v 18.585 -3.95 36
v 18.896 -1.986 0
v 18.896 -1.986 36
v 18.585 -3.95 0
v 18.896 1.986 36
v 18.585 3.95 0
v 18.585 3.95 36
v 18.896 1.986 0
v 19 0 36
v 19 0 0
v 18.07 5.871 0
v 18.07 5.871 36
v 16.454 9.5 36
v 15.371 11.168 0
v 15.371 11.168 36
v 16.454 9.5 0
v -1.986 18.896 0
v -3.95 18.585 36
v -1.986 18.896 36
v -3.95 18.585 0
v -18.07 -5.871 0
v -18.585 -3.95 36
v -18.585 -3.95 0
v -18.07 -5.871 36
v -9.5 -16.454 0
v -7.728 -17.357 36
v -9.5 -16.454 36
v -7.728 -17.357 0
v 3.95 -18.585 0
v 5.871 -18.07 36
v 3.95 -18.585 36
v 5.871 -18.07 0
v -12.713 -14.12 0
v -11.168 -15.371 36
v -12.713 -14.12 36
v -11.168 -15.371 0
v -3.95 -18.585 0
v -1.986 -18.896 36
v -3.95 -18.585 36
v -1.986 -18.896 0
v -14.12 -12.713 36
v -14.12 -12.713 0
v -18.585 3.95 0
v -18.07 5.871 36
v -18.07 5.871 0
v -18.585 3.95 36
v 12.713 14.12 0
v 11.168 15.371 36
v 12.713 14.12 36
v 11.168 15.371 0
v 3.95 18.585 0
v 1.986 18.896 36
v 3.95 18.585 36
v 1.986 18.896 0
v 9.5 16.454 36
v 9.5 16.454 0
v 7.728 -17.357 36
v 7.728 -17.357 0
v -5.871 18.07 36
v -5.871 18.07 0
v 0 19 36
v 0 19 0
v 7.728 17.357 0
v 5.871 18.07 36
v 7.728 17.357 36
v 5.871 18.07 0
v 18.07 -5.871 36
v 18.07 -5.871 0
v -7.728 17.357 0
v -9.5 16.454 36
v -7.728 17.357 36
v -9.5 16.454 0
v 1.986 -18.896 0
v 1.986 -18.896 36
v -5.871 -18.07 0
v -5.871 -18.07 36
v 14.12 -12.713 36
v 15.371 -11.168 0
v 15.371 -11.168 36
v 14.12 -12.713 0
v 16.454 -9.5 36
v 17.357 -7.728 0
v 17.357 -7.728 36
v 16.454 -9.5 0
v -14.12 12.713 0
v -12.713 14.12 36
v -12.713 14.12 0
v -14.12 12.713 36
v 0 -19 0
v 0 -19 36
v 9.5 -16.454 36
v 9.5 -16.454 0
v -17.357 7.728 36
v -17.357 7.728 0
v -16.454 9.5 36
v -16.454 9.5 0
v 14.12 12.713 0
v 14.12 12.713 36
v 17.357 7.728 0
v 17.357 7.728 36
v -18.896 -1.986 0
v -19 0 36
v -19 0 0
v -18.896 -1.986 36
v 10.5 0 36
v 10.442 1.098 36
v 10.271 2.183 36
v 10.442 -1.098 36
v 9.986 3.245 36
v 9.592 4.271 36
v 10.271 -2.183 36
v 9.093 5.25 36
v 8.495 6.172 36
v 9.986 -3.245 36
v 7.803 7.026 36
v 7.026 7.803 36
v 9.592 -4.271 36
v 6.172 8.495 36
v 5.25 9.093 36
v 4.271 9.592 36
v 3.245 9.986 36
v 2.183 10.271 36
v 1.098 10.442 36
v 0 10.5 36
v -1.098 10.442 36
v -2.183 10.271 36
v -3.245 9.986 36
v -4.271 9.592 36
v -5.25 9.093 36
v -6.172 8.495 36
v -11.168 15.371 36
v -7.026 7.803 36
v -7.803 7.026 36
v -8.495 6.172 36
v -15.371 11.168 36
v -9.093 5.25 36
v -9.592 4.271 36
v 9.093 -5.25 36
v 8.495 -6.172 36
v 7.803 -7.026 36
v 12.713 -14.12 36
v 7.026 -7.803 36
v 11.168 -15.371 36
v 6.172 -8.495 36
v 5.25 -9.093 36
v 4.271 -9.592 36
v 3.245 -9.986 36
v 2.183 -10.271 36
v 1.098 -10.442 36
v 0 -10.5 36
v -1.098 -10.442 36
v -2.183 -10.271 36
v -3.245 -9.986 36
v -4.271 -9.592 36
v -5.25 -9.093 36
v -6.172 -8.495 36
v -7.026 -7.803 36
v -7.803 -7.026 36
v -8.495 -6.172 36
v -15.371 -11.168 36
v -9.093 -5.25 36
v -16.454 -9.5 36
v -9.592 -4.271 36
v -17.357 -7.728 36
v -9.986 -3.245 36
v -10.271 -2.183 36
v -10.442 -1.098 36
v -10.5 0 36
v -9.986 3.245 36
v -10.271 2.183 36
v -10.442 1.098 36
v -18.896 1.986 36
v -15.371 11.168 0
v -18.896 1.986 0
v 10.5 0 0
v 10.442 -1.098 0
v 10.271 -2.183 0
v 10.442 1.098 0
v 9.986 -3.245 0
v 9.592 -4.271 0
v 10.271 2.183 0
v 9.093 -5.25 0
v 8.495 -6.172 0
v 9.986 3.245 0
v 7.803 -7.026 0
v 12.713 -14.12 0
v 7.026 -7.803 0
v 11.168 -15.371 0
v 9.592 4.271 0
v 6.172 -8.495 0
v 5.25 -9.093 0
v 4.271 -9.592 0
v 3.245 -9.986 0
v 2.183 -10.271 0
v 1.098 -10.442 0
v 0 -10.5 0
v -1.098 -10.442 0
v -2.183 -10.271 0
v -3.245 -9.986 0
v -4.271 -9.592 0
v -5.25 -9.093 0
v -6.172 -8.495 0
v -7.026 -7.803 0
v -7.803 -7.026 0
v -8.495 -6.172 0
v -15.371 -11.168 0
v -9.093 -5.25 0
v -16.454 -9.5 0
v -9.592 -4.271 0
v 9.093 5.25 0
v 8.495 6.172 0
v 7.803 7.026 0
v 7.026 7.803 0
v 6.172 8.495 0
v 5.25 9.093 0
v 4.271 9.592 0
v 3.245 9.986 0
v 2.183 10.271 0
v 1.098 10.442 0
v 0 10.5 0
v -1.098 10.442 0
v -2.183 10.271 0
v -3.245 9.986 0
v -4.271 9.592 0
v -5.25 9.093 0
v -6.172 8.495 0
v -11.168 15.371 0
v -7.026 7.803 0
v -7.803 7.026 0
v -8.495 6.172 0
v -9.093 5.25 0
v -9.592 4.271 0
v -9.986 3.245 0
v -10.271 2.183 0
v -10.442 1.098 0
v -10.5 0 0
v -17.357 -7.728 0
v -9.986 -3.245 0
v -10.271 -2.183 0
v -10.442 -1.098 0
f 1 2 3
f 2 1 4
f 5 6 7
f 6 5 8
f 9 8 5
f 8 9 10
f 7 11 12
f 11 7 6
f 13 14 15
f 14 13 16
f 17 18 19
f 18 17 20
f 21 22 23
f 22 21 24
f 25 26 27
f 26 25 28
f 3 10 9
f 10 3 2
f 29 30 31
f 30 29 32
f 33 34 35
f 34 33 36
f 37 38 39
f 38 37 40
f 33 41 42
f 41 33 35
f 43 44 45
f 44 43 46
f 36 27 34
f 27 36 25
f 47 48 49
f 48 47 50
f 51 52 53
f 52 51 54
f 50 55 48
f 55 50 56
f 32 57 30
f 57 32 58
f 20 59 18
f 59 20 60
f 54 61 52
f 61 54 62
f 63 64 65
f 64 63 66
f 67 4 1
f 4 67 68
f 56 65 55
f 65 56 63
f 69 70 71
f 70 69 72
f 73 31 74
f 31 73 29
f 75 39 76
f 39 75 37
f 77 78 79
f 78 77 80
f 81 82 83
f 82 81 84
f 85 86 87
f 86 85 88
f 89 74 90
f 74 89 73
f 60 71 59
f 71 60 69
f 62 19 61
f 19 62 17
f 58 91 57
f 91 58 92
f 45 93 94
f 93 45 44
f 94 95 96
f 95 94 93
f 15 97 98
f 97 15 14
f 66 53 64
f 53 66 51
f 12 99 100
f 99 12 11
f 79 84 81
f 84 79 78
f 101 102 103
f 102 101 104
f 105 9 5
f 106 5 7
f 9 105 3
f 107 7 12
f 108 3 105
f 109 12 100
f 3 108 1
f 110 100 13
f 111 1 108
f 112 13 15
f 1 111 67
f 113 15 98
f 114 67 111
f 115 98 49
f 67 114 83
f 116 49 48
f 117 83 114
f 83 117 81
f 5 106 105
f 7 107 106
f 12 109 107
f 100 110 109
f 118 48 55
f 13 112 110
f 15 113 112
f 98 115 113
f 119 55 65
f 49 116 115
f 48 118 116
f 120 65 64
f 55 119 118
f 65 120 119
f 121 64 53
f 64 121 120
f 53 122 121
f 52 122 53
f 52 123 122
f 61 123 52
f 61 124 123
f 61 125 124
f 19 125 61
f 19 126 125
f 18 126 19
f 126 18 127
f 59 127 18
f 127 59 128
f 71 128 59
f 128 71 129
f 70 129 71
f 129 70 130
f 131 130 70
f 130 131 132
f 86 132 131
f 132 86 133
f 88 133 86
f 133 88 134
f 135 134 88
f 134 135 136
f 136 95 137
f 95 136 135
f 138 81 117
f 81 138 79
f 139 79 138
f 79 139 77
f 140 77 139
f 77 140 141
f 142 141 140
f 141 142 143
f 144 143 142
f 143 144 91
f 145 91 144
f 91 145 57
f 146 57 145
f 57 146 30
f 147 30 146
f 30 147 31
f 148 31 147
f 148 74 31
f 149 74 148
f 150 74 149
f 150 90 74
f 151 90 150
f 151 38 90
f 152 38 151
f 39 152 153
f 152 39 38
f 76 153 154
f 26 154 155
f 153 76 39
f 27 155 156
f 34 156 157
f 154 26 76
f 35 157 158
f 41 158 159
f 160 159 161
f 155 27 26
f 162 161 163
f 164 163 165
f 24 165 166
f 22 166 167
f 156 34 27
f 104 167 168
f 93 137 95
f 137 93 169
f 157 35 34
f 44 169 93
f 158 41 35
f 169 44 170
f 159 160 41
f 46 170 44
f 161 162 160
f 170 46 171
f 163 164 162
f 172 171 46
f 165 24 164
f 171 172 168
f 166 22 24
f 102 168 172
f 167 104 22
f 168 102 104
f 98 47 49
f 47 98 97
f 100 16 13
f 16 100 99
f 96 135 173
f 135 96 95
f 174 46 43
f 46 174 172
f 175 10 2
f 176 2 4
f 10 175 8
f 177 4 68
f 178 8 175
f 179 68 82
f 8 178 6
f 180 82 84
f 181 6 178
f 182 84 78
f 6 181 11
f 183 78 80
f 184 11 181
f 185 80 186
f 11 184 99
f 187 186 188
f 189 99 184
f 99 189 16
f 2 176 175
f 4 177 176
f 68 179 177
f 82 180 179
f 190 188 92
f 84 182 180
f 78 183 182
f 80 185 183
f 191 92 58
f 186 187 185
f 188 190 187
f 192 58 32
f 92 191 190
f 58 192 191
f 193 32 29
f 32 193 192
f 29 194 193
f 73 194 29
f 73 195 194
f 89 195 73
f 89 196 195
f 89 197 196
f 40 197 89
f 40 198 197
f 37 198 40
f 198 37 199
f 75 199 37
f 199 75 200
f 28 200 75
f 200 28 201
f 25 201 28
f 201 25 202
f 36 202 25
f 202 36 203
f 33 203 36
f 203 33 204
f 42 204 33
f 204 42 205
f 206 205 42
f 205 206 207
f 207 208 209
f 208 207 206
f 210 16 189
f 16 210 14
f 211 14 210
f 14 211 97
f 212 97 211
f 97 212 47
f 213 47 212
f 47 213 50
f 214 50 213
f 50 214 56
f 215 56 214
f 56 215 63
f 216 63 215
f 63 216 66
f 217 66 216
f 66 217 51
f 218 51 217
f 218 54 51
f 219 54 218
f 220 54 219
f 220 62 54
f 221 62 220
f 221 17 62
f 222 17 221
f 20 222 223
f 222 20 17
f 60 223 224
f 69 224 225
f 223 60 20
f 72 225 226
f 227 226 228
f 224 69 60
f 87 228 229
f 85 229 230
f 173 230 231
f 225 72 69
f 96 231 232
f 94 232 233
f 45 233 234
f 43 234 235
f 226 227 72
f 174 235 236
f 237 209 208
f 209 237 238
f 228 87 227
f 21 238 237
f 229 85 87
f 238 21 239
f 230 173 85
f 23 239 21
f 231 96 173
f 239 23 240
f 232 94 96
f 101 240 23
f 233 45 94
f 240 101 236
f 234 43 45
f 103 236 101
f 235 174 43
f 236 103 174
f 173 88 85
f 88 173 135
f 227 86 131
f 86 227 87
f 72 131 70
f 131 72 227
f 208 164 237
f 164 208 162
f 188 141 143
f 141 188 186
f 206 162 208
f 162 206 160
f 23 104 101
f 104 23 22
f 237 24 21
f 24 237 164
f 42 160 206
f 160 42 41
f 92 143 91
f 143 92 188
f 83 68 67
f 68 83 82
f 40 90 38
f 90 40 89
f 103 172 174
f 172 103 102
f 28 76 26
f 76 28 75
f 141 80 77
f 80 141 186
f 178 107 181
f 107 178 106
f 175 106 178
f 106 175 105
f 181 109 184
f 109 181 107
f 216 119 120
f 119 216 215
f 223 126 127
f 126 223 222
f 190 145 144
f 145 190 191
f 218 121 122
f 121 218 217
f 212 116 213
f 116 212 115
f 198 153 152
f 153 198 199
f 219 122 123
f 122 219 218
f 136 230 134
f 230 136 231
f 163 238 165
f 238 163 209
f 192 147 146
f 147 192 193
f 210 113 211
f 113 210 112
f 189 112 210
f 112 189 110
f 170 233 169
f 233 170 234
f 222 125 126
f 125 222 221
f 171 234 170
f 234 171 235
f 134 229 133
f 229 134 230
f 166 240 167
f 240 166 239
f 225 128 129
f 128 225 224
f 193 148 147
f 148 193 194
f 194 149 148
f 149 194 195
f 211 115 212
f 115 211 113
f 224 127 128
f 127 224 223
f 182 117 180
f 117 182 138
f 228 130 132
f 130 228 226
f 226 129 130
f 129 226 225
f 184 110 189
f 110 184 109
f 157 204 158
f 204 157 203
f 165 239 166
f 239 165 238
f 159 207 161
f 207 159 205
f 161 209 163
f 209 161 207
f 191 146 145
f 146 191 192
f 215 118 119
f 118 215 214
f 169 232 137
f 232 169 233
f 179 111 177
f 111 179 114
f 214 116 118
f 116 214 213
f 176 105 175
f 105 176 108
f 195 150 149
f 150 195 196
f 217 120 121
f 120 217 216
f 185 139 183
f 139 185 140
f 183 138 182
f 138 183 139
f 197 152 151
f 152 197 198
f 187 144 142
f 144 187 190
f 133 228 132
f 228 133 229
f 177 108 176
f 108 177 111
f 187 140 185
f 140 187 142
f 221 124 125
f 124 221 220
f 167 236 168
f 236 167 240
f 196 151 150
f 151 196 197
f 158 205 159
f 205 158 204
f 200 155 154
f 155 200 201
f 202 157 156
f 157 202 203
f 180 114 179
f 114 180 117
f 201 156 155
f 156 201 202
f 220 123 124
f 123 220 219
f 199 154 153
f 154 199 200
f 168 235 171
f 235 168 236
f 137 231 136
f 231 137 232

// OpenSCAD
// Round spacer.
$fn = 60;
eps = 0.02;
inner_d = 21;
outer_d = 38;
length = 36;
difference() { cylinder(d=outer_d,h=length); translate([0,0,-eps]) cylinder(d=inner_d,h=length+2*eps); }
